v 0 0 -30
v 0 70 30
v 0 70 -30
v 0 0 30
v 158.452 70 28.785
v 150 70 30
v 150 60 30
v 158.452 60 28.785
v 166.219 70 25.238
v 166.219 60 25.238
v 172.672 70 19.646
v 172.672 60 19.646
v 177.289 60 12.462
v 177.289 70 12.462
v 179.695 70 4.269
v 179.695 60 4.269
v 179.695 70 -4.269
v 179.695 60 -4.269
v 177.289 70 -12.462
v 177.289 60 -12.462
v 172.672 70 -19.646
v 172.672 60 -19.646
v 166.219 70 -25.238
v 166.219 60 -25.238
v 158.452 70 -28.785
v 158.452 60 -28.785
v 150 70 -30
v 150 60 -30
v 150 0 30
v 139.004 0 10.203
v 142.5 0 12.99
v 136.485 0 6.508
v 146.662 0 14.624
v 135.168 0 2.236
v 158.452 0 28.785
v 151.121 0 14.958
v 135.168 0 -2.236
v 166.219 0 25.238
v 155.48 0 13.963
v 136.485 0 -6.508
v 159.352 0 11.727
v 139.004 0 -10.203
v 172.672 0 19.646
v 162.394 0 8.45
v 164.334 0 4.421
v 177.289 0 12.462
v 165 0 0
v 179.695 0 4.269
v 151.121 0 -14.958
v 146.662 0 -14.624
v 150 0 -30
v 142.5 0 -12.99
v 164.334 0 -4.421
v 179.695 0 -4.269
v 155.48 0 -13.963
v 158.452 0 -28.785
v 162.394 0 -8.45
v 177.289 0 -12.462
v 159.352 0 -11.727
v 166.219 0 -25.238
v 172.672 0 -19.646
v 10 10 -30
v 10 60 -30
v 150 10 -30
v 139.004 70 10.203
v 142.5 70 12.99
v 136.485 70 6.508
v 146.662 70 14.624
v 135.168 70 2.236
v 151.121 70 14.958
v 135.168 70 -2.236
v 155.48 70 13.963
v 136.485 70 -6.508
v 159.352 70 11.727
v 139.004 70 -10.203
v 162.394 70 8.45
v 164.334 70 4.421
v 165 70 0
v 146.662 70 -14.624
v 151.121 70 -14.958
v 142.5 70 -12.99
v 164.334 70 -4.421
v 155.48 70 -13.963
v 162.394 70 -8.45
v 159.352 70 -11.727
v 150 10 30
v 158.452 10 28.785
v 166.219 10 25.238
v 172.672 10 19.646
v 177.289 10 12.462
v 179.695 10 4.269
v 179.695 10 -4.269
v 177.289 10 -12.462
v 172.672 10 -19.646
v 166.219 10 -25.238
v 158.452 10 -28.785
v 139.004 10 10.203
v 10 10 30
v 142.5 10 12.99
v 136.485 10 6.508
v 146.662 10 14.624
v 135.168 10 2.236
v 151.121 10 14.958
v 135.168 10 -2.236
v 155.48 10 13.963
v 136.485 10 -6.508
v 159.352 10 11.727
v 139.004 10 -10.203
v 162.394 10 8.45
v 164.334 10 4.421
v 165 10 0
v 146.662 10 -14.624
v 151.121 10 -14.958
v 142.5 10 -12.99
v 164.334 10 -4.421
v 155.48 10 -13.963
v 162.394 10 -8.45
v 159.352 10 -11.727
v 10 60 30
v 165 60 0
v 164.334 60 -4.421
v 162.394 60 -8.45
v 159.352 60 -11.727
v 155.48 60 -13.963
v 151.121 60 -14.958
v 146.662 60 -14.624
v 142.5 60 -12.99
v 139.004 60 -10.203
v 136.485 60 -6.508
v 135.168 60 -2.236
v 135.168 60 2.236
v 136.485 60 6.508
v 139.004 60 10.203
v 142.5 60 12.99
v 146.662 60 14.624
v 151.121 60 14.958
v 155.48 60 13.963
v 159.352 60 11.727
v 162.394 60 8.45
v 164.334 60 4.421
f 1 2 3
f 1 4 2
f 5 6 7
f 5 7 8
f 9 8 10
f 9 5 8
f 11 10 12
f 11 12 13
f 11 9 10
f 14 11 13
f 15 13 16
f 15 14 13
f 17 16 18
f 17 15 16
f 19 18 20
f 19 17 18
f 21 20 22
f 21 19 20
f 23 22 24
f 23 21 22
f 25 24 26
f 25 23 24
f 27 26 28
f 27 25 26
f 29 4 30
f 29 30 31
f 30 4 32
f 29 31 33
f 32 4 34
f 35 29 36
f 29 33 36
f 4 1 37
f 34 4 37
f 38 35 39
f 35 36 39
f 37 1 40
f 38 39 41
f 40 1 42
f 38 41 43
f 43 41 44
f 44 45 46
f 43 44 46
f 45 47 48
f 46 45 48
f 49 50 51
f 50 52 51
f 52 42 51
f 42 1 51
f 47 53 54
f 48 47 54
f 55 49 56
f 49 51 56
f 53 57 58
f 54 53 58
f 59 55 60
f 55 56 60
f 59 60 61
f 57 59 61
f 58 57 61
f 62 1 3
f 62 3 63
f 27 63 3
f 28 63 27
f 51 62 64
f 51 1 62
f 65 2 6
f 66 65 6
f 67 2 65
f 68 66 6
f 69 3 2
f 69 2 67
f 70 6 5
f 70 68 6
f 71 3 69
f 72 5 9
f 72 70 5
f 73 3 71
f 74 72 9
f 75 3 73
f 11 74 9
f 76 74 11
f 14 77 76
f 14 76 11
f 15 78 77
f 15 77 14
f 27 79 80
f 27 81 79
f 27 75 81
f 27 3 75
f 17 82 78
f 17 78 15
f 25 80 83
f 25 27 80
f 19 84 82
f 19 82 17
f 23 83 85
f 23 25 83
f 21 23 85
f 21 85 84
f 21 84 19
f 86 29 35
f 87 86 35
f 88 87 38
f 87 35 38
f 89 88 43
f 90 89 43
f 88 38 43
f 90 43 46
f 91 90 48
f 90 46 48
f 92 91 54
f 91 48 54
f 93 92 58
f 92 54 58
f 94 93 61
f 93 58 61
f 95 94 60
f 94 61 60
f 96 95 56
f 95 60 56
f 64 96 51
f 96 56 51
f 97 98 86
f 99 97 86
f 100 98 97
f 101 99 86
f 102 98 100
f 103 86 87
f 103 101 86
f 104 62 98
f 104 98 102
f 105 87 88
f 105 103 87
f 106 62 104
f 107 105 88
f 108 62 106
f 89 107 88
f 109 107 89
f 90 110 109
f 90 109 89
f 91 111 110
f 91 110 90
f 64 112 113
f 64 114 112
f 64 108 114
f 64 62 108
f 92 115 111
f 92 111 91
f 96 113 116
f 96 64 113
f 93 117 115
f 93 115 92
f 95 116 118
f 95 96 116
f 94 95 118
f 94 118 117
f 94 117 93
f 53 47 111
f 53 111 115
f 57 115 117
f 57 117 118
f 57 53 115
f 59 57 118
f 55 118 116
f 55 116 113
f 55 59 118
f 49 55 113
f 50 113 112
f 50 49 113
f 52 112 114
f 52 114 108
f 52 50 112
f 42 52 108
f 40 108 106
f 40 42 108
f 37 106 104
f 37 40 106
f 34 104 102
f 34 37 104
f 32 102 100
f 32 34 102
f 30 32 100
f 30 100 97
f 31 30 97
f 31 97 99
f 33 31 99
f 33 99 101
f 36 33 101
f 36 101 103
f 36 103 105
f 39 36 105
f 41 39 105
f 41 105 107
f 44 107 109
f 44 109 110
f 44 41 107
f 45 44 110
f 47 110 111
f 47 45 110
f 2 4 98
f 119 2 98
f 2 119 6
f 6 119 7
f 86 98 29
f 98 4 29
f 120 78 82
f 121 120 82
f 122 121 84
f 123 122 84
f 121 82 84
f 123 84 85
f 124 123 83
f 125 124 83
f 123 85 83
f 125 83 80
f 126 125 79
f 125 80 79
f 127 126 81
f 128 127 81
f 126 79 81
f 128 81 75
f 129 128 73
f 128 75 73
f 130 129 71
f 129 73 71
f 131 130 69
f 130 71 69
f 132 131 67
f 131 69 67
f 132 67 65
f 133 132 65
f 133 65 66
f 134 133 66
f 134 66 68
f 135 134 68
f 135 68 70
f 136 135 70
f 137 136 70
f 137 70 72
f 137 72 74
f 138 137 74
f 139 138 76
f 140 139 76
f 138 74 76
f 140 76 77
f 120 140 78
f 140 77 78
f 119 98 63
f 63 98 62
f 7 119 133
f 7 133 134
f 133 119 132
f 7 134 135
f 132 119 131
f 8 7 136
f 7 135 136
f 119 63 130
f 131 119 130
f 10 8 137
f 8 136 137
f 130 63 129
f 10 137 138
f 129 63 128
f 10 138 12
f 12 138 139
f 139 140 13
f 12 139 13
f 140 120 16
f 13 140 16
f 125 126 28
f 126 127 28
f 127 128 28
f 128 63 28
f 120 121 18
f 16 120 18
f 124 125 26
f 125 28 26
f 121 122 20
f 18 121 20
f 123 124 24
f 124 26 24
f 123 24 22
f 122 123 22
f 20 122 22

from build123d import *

# Parameters (mm, degrees)
SKETCH1_R           = 15
BOSS_EXTRUDE1_DEPTH = 10
SKETCH2_W           = 10
SKETCH2_H           = 60
BOSS_EXTRUDE2_DEPTH = 60


with BuildPart() as part:
    # Sketch1 → Boss-Extrude1 (new body)
    with BuildSketch(Plane(origin=(0, 0, 0), x_dir=(1, 0, 0), z_dir=(0, 1, 0))):
        with BuildLine():
            Line((0, 30), (0, -30))
            Line((0, -30), (150, -30))
            ThreePointArc((150, -30), (180, 0), (150, 30))
            Line((150, 30), (0, 30))
        make_face()
        with Locations((150, 0)):
            Circle(SKETCH1_R, mode=Mode.SUBTRACT)
    boss_extrude1 = extrude(amount=BOSS_EXTRUDE1_DEPTH)

    # Sketch2 → Boss-Extrude2 (add)
    with BuildSketch(Plane(origin=(0, 10, 0), x_dir=(1, 0, 0), z_dir=(0, 1, 0))):
        with Locations((5, 0)):
            Rectangle(SKETCH2_W, SKETCH2_H)
    extrude(amount=BOSS_EXTRUDE2_DEPTH)

    # Mirror2: Boss-Extrude1 across plane
    add(boss_extrude1.mirror(Plane.ZX.offset(35)))


solid = part.part
